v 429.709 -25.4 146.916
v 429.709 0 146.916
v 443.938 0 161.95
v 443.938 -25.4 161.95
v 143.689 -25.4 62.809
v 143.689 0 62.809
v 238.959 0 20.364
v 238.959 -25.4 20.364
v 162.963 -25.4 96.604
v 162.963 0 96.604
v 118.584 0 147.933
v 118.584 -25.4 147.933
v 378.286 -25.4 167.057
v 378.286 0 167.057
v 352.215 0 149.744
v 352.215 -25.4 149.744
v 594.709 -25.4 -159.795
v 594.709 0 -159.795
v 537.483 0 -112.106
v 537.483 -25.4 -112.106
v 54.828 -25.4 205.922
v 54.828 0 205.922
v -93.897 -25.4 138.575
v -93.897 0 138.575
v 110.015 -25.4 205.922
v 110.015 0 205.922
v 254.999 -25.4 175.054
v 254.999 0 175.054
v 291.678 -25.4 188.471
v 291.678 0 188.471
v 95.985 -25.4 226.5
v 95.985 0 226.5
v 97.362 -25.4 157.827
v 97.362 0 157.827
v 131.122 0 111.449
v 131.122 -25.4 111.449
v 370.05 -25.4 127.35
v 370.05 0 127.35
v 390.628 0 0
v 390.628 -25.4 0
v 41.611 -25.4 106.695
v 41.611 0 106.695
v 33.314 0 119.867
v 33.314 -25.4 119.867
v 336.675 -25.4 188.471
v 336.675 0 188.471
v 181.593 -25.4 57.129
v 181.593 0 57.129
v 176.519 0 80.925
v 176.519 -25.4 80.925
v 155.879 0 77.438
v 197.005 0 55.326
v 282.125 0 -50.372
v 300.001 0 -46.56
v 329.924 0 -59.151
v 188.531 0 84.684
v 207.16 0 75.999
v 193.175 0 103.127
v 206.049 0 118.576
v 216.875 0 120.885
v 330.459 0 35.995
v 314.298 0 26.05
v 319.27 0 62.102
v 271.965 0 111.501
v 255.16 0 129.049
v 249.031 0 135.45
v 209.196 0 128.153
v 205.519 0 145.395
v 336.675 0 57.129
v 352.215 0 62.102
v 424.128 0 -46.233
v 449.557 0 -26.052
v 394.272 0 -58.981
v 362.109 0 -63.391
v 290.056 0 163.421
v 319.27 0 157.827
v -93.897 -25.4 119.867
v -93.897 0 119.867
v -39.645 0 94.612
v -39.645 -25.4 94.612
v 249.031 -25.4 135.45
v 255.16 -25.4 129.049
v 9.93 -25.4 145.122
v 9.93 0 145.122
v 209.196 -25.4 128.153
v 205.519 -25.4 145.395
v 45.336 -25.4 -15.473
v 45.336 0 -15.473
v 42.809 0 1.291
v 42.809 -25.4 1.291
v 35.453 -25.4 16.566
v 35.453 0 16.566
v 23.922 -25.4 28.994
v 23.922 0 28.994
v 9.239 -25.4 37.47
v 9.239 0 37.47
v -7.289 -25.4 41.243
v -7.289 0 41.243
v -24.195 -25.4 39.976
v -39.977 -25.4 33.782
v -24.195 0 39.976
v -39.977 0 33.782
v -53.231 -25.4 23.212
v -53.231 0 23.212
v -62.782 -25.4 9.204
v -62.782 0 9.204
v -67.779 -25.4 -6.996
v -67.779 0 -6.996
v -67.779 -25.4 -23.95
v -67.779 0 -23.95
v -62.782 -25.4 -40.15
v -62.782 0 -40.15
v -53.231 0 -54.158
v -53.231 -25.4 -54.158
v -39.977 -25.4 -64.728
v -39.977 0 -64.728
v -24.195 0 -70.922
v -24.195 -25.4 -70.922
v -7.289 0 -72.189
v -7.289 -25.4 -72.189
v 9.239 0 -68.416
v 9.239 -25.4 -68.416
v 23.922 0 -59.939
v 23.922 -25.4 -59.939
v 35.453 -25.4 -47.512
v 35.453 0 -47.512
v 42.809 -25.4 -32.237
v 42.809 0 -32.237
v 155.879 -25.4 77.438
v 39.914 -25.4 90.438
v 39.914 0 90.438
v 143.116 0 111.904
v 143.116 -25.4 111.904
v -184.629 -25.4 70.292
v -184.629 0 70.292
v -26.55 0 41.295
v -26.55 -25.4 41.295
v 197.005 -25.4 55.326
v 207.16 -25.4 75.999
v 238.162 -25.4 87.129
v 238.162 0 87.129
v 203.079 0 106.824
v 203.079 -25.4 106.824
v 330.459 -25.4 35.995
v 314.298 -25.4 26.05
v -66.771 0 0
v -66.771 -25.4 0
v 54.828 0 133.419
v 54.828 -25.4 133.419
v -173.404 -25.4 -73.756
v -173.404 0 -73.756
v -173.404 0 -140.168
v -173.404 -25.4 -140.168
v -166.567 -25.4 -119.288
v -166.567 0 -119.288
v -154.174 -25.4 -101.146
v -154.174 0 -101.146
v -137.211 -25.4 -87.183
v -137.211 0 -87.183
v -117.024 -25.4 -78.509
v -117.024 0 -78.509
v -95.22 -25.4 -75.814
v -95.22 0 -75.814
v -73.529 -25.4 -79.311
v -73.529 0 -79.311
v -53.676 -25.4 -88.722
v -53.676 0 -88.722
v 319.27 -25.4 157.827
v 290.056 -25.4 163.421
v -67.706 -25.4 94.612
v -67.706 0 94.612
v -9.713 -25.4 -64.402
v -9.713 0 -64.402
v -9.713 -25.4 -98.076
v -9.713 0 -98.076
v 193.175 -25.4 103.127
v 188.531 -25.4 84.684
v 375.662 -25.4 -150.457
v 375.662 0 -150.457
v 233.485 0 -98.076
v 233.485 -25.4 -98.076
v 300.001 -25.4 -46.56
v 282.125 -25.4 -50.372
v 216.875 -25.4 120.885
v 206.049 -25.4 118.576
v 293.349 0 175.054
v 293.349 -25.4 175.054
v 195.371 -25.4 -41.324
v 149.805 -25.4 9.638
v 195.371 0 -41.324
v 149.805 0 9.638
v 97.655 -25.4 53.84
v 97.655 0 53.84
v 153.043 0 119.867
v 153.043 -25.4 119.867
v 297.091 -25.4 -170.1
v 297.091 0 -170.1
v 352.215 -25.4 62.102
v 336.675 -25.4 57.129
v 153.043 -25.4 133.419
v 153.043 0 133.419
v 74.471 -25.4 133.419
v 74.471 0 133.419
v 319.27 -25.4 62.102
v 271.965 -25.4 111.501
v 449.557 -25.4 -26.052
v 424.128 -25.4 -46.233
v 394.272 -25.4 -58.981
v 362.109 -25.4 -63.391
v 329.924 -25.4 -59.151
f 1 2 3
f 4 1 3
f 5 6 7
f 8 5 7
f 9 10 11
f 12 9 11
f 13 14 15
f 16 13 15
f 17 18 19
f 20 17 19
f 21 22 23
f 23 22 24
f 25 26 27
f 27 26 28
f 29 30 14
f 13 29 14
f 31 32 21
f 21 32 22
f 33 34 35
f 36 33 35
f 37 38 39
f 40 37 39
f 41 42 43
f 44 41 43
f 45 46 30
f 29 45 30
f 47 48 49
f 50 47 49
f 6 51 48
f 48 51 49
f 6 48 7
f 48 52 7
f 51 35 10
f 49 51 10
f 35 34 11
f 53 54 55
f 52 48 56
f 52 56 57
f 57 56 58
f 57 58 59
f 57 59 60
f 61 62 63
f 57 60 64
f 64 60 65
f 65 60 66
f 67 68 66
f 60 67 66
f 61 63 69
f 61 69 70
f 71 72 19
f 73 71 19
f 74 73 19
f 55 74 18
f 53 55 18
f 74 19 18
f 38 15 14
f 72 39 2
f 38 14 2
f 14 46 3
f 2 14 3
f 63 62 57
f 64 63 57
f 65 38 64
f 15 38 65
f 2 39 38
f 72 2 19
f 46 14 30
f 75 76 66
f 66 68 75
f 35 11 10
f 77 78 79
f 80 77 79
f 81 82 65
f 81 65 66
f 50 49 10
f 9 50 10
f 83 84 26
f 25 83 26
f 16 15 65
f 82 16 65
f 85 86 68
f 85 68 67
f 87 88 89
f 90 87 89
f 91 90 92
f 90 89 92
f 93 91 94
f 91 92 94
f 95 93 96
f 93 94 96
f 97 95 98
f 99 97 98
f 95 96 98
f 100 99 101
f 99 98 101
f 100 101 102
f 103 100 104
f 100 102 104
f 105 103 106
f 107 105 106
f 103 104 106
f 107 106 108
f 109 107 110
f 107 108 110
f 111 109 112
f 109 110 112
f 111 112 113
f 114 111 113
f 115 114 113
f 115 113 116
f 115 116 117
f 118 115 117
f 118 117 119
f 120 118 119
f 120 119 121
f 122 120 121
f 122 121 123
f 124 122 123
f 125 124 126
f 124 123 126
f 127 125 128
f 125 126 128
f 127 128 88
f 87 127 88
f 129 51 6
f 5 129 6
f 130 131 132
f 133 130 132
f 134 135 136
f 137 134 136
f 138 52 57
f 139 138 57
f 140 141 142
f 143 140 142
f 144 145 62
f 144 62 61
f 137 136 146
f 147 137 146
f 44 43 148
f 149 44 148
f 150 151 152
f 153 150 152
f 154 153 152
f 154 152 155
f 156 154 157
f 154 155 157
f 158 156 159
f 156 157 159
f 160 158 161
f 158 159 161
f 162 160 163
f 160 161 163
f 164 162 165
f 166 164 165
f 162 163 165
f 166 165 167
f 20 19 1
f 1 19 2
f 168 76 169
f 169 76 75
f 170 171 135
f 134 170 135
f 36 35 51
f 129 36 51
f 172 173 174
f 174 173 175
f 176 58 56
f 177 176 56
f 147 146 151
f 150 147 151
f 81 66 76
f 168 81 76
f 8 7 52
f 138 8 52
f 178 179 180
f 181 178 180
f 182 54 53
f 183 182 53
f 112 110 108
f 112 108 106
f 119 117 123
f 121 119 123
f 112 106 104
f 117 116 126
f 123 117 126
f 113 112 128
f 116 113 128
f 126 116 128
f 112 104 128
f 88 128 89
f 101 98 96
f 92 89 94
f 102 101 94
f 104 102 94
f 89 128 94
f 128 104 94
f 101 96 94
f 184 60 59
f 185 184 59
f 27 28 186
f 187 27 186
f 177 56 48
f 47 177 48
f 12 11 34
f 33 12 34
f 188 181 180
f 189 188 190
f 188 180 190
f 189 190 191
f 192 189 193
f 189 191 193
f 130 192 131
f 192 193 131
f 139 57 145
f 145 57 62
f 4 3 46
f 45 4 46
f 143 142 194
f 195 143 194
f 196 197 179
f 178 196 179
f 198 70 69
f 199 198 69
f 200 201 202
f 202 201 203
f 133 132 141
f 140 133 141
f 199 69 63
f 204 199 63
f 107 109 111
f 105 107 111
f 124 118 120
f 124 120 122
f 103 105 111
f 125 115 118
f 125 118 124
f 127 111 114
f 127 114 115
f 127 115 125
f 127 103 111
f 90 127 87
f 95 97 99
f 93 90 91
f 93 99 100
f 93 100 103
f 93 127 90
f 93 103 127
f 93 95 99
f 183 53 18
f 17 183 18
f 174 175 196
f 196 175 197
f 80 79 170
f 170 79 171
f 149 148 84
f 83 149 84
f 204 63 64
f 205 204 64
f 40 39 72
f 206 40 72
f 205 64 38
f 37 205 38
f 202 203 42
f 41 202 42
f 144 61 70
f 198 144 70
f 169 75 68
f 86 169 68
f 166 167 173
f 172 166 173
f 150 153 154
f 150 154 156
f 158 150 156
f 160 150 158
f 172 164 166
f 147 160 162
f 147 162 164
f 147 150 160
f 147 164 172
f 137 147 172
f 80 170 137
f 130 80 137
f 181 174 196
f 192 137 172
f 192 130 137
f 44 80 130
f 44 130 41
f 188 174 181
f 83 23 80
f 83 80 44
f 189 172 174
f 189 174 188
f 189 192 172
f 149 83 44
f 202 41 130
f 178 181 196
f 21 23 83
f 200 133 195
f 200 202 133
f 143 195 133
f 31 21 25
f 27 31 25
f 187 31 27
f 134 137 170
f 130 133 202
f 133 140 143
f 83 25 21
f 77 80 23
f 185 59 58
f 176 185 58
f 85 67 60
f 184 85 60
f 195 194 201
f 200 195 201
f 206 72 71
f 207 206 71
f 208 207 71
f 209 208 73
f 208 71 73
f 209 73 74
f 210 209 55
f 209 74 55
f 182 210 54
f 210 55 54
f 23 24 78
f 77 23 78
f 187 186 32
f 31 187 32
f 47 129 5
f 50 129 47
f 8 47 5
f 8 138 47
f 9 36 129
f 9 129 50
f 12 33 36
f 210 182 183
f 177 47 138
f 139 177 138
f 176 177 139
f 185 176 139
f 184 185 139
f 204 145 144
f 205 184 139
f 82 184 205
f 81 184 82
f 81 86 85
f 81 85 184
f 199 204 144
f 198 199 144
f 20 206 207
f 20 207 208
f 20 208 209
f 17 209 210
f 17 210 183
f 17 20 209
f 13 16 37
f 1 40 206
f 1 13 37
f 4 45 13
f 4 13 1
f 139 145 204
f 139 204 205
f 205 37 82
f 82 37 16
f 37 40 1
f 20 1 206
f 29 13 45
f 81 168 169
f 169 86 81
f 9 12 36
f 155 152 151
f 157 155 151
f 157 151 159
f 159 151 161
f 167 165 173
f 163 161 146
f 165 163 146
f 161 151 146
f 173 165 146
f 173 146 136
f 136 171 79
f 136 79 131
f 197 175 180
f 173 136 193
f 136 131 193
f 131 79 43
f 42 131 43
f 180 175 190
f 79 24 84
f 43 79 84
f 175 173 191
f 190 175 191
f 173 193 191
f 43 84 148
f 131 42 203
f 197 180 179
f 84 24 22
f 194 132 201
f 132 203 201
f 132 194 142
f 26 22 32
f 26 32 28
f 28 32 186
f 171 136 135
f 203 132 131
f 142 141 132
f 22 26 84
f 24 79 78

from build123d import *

# Parameters (mm, degrees)
F2_DEPTH = 25.4
F0_R     = 56.874736522
F4_DEPTH = 25.4


with BuildPart() as f2:
    # F1 (on Front) → F2 (new body)
    with BuildSketch(Plane.XZ):
        Polygon((97.3623842001, 157.826974988), (131.1217065965, 111.4492850022), (162.9634663396, 96.60414105), (118.5843721032, 147.9329406156), align=None)
        with BuildLine():
            Line((255.160440026, 129.0485934543), (271.9647816435, 111.5006950761))
            Line((271.9647816435, 111.5006950761), (370.050162077, 127.35016644))
            Line((370.050162077, 127.35016644), (390.6284868717, 0))
            Line((390.6284868717, 0), (449.5572447777, -26.0517243296))
            ThreePointArc((449.5572447777, -26.0517243296), (378.3384551006, -62.2624967169), (300.0009953976, -46.559680179))
            Line((300.0009953976, -46.559680179), (282.1246683598, -50.371542573))
            Line((282.1246683598, -50.371542573), (594.7094174282, -159.7953251611))
            Line((594.7094174282, -159.7953251611), (537.4827384949, -112.1064573526))
            Line((537.4827384949, -112.1064573526), (429.7089413172, 146.9157032843))
            Line((429.7089413172, 146.9157032843), (443.9377291613, 161.9496632187))
            Line((443.9377291613, 161.9496632187), (336.6748690605, 188.4707063437))
            Line((336.6748690605, 188.4707063437), (291.6783094406, 188.4707063437))
            Line((291.6783094406, 188.4707063437), (378.2855272293, 167.0568287373))
            Line((378.2855272293, 167.0568287373), (352.2146344185, 149.7439652161))
            Line((352.2146344185, 149.7439652161), (255.160440026, 129.0485934543))
        make_face()
        Polygon((209.1958191275, 128.1530192824), (216.8752775893, 120.884848708), (255.160440026, 129.0485934543), (249.0305602551, 135.4497075081), (319.2703127861, 157.826974988), (290.0555431843, 163.4213030338), (205.5191844702, 145.3951746225), align=None)
        Polygon((220.5155867332, 103.1870958647), (207.1602131464, 75.9989020851), (314.2975866795, 26.0497238487), (330.4589688778, 35.9951779246), (352.2146344185, 62.1019937098), (336.6748690605, 57.1292676032), (319.2703127861, 62.1019937098), (271.9647816435, 111.5006950761), (233.3784030187, 105.2655792989), align=None)
        Polygon((162.9634663396, 96.60414105), (131.1217065965, 111.4492850022), (155.8793856038, 77.4378214935), (143.6888128519, 62.809124589), (238.9593260341, 20.3644687398), (197.0053315163, 55.3261078894), (207.1602131464, 75.9989020851), (188.531082378, 84.6841044795), (181.5934830965, 57.1292676032), (176.5192896128, 80.9254944324), align=None)
        Polygon((193.1745260954, 103.1269878149), (188.531082378, 84.6841044795), (207.1602131464, 75.9989020851), (220.5155867332, 103.1870958647), (233.3784030187, 105.2655792989), (216.8752775893, 120.884848708), (206.0489376394, 118.5762918085), align=None)
        Polygon((216.8752775893, 120.884848708), (233.3784030187, 105.2655792989), (271.9647816435, 111.5006950761), (255.160440026, 129.0485934543), align=None)
    extrude(amount=F2_DEPTH)


with BuildPart() as f2b:
    # F0 (on Front) → F2, piece 2 (new body)
    with BuildSketch(Plane.XZ):
        with Locations((-11.5391798317, -15.4729206115)):
            Circle(F0_R)
    extrude(amount=F2_DEPTH)


with BuildPart() as f4:
    # F3 (on Front) → F4 (new body)
    with BuildSketch(Plane.XZ):
        with BuildLine():
            Line((-184.6286505461, 70.2921450138), (-26.5498682857, 41.2954464555))
            Line((-26.5498682857, 41.2954464555), (-66.7710974813, 0))
            Line((-66.7710974813, 0), (-173.4041124582, -73.7559720874))
            Line((-173.4041124582, -73.7559720874), (-173.4041124582, -140.1677727699))
            ThreePointArc((-173.4041124582, -140.1677727699), (-127.4246598374, -82.1314180062), (-53.6758117378, -88.7220129371))
            Line((-53.6758117378, -88.7220129371), (-9.7130751237, -64.4022002816))
            Line((-9.7130751237, -64.4022002816), (-9.7130751237, -98.0757921934))
            Line((-9.7130751237, -98.0757921934), (297.0907092094, -170.0998544693))
            Line((297.0907092094, -170.0998544693), (375.662446022, -150.4569202662))
            Line((375.662446022, -150.4569202662), (233.4850430489, -98.0757921934))
            ThreePointArc((233.4850430489, -98.0757921934), (149.8050921338, 9.6380229284), (39.914448045, 90.4380631201))
            Line((39.914448045, 90.4380631201), (143.115914138, 111.903967857))
            Line((143.115914138, 111.903967857), (238.1619513035, 87.1289372444))
            Line((238.1619513035, 87.1289372444), (203.0790512679, 106.824474055))
            Line((203.0790512679, 106.824474055), (153.0425846577, 119.8671534657))
            Line((153.0425846577, 119.8671534657), (153.0425846577, 133.4190372256))
            Line((153.0425846577, 133.4190372256), (74.4708925486, 133.4190372256))
            Line((74.4708925486, 133.4190372256), (41.6113905826, 106.6954664946))
            Line((41.6113905826, 106.6954664946), (33.3142876625, 119.8671534657))
            Line((33.3142876625, 119.8671534657), (54.8279620707, 133.4190372256))
            Line((54.8279620707, 133.4190372256), (9.9298534915, 145.1223343611))
            Line((9.9298534915, 145.1223343611), (110.0152358413, 205.9218734503))
            Line((110.0152358413, 205.9218734503), (254.9987435341, 175.0544160604))
            Line((254.9987435341, 175.0544160604), (293.3492064476, 175.0544160604))
            Line((293.3492064476, 175.0544160604), (95.984570682, 226.5001684427))
            Line((95.984570682, 226.5001684427), (54.8279620707, 205.9218734503))
            Line((54.8279620707, 205.9218734503), (-93.8970446587, 138.5746896267))
            Line((-93.8970446587, 138.5746896267), (-93.8970446587, 119.8671534657))
            Line((-93.8970446587, 119.8671534657), (-39.6451503038, 94.6119576693))
            Line((-39.6451503038, 94.6119576693), (-67.7064731717, 94.6119576693))
            Line((-67.7064731717, 94.6119576693), (-184.6286505461, 70.2921450138))
        make_face()
    extrude(amount=F4_DEPTH)


solid = Compound([f2.part, f2b.part, f4.part])
